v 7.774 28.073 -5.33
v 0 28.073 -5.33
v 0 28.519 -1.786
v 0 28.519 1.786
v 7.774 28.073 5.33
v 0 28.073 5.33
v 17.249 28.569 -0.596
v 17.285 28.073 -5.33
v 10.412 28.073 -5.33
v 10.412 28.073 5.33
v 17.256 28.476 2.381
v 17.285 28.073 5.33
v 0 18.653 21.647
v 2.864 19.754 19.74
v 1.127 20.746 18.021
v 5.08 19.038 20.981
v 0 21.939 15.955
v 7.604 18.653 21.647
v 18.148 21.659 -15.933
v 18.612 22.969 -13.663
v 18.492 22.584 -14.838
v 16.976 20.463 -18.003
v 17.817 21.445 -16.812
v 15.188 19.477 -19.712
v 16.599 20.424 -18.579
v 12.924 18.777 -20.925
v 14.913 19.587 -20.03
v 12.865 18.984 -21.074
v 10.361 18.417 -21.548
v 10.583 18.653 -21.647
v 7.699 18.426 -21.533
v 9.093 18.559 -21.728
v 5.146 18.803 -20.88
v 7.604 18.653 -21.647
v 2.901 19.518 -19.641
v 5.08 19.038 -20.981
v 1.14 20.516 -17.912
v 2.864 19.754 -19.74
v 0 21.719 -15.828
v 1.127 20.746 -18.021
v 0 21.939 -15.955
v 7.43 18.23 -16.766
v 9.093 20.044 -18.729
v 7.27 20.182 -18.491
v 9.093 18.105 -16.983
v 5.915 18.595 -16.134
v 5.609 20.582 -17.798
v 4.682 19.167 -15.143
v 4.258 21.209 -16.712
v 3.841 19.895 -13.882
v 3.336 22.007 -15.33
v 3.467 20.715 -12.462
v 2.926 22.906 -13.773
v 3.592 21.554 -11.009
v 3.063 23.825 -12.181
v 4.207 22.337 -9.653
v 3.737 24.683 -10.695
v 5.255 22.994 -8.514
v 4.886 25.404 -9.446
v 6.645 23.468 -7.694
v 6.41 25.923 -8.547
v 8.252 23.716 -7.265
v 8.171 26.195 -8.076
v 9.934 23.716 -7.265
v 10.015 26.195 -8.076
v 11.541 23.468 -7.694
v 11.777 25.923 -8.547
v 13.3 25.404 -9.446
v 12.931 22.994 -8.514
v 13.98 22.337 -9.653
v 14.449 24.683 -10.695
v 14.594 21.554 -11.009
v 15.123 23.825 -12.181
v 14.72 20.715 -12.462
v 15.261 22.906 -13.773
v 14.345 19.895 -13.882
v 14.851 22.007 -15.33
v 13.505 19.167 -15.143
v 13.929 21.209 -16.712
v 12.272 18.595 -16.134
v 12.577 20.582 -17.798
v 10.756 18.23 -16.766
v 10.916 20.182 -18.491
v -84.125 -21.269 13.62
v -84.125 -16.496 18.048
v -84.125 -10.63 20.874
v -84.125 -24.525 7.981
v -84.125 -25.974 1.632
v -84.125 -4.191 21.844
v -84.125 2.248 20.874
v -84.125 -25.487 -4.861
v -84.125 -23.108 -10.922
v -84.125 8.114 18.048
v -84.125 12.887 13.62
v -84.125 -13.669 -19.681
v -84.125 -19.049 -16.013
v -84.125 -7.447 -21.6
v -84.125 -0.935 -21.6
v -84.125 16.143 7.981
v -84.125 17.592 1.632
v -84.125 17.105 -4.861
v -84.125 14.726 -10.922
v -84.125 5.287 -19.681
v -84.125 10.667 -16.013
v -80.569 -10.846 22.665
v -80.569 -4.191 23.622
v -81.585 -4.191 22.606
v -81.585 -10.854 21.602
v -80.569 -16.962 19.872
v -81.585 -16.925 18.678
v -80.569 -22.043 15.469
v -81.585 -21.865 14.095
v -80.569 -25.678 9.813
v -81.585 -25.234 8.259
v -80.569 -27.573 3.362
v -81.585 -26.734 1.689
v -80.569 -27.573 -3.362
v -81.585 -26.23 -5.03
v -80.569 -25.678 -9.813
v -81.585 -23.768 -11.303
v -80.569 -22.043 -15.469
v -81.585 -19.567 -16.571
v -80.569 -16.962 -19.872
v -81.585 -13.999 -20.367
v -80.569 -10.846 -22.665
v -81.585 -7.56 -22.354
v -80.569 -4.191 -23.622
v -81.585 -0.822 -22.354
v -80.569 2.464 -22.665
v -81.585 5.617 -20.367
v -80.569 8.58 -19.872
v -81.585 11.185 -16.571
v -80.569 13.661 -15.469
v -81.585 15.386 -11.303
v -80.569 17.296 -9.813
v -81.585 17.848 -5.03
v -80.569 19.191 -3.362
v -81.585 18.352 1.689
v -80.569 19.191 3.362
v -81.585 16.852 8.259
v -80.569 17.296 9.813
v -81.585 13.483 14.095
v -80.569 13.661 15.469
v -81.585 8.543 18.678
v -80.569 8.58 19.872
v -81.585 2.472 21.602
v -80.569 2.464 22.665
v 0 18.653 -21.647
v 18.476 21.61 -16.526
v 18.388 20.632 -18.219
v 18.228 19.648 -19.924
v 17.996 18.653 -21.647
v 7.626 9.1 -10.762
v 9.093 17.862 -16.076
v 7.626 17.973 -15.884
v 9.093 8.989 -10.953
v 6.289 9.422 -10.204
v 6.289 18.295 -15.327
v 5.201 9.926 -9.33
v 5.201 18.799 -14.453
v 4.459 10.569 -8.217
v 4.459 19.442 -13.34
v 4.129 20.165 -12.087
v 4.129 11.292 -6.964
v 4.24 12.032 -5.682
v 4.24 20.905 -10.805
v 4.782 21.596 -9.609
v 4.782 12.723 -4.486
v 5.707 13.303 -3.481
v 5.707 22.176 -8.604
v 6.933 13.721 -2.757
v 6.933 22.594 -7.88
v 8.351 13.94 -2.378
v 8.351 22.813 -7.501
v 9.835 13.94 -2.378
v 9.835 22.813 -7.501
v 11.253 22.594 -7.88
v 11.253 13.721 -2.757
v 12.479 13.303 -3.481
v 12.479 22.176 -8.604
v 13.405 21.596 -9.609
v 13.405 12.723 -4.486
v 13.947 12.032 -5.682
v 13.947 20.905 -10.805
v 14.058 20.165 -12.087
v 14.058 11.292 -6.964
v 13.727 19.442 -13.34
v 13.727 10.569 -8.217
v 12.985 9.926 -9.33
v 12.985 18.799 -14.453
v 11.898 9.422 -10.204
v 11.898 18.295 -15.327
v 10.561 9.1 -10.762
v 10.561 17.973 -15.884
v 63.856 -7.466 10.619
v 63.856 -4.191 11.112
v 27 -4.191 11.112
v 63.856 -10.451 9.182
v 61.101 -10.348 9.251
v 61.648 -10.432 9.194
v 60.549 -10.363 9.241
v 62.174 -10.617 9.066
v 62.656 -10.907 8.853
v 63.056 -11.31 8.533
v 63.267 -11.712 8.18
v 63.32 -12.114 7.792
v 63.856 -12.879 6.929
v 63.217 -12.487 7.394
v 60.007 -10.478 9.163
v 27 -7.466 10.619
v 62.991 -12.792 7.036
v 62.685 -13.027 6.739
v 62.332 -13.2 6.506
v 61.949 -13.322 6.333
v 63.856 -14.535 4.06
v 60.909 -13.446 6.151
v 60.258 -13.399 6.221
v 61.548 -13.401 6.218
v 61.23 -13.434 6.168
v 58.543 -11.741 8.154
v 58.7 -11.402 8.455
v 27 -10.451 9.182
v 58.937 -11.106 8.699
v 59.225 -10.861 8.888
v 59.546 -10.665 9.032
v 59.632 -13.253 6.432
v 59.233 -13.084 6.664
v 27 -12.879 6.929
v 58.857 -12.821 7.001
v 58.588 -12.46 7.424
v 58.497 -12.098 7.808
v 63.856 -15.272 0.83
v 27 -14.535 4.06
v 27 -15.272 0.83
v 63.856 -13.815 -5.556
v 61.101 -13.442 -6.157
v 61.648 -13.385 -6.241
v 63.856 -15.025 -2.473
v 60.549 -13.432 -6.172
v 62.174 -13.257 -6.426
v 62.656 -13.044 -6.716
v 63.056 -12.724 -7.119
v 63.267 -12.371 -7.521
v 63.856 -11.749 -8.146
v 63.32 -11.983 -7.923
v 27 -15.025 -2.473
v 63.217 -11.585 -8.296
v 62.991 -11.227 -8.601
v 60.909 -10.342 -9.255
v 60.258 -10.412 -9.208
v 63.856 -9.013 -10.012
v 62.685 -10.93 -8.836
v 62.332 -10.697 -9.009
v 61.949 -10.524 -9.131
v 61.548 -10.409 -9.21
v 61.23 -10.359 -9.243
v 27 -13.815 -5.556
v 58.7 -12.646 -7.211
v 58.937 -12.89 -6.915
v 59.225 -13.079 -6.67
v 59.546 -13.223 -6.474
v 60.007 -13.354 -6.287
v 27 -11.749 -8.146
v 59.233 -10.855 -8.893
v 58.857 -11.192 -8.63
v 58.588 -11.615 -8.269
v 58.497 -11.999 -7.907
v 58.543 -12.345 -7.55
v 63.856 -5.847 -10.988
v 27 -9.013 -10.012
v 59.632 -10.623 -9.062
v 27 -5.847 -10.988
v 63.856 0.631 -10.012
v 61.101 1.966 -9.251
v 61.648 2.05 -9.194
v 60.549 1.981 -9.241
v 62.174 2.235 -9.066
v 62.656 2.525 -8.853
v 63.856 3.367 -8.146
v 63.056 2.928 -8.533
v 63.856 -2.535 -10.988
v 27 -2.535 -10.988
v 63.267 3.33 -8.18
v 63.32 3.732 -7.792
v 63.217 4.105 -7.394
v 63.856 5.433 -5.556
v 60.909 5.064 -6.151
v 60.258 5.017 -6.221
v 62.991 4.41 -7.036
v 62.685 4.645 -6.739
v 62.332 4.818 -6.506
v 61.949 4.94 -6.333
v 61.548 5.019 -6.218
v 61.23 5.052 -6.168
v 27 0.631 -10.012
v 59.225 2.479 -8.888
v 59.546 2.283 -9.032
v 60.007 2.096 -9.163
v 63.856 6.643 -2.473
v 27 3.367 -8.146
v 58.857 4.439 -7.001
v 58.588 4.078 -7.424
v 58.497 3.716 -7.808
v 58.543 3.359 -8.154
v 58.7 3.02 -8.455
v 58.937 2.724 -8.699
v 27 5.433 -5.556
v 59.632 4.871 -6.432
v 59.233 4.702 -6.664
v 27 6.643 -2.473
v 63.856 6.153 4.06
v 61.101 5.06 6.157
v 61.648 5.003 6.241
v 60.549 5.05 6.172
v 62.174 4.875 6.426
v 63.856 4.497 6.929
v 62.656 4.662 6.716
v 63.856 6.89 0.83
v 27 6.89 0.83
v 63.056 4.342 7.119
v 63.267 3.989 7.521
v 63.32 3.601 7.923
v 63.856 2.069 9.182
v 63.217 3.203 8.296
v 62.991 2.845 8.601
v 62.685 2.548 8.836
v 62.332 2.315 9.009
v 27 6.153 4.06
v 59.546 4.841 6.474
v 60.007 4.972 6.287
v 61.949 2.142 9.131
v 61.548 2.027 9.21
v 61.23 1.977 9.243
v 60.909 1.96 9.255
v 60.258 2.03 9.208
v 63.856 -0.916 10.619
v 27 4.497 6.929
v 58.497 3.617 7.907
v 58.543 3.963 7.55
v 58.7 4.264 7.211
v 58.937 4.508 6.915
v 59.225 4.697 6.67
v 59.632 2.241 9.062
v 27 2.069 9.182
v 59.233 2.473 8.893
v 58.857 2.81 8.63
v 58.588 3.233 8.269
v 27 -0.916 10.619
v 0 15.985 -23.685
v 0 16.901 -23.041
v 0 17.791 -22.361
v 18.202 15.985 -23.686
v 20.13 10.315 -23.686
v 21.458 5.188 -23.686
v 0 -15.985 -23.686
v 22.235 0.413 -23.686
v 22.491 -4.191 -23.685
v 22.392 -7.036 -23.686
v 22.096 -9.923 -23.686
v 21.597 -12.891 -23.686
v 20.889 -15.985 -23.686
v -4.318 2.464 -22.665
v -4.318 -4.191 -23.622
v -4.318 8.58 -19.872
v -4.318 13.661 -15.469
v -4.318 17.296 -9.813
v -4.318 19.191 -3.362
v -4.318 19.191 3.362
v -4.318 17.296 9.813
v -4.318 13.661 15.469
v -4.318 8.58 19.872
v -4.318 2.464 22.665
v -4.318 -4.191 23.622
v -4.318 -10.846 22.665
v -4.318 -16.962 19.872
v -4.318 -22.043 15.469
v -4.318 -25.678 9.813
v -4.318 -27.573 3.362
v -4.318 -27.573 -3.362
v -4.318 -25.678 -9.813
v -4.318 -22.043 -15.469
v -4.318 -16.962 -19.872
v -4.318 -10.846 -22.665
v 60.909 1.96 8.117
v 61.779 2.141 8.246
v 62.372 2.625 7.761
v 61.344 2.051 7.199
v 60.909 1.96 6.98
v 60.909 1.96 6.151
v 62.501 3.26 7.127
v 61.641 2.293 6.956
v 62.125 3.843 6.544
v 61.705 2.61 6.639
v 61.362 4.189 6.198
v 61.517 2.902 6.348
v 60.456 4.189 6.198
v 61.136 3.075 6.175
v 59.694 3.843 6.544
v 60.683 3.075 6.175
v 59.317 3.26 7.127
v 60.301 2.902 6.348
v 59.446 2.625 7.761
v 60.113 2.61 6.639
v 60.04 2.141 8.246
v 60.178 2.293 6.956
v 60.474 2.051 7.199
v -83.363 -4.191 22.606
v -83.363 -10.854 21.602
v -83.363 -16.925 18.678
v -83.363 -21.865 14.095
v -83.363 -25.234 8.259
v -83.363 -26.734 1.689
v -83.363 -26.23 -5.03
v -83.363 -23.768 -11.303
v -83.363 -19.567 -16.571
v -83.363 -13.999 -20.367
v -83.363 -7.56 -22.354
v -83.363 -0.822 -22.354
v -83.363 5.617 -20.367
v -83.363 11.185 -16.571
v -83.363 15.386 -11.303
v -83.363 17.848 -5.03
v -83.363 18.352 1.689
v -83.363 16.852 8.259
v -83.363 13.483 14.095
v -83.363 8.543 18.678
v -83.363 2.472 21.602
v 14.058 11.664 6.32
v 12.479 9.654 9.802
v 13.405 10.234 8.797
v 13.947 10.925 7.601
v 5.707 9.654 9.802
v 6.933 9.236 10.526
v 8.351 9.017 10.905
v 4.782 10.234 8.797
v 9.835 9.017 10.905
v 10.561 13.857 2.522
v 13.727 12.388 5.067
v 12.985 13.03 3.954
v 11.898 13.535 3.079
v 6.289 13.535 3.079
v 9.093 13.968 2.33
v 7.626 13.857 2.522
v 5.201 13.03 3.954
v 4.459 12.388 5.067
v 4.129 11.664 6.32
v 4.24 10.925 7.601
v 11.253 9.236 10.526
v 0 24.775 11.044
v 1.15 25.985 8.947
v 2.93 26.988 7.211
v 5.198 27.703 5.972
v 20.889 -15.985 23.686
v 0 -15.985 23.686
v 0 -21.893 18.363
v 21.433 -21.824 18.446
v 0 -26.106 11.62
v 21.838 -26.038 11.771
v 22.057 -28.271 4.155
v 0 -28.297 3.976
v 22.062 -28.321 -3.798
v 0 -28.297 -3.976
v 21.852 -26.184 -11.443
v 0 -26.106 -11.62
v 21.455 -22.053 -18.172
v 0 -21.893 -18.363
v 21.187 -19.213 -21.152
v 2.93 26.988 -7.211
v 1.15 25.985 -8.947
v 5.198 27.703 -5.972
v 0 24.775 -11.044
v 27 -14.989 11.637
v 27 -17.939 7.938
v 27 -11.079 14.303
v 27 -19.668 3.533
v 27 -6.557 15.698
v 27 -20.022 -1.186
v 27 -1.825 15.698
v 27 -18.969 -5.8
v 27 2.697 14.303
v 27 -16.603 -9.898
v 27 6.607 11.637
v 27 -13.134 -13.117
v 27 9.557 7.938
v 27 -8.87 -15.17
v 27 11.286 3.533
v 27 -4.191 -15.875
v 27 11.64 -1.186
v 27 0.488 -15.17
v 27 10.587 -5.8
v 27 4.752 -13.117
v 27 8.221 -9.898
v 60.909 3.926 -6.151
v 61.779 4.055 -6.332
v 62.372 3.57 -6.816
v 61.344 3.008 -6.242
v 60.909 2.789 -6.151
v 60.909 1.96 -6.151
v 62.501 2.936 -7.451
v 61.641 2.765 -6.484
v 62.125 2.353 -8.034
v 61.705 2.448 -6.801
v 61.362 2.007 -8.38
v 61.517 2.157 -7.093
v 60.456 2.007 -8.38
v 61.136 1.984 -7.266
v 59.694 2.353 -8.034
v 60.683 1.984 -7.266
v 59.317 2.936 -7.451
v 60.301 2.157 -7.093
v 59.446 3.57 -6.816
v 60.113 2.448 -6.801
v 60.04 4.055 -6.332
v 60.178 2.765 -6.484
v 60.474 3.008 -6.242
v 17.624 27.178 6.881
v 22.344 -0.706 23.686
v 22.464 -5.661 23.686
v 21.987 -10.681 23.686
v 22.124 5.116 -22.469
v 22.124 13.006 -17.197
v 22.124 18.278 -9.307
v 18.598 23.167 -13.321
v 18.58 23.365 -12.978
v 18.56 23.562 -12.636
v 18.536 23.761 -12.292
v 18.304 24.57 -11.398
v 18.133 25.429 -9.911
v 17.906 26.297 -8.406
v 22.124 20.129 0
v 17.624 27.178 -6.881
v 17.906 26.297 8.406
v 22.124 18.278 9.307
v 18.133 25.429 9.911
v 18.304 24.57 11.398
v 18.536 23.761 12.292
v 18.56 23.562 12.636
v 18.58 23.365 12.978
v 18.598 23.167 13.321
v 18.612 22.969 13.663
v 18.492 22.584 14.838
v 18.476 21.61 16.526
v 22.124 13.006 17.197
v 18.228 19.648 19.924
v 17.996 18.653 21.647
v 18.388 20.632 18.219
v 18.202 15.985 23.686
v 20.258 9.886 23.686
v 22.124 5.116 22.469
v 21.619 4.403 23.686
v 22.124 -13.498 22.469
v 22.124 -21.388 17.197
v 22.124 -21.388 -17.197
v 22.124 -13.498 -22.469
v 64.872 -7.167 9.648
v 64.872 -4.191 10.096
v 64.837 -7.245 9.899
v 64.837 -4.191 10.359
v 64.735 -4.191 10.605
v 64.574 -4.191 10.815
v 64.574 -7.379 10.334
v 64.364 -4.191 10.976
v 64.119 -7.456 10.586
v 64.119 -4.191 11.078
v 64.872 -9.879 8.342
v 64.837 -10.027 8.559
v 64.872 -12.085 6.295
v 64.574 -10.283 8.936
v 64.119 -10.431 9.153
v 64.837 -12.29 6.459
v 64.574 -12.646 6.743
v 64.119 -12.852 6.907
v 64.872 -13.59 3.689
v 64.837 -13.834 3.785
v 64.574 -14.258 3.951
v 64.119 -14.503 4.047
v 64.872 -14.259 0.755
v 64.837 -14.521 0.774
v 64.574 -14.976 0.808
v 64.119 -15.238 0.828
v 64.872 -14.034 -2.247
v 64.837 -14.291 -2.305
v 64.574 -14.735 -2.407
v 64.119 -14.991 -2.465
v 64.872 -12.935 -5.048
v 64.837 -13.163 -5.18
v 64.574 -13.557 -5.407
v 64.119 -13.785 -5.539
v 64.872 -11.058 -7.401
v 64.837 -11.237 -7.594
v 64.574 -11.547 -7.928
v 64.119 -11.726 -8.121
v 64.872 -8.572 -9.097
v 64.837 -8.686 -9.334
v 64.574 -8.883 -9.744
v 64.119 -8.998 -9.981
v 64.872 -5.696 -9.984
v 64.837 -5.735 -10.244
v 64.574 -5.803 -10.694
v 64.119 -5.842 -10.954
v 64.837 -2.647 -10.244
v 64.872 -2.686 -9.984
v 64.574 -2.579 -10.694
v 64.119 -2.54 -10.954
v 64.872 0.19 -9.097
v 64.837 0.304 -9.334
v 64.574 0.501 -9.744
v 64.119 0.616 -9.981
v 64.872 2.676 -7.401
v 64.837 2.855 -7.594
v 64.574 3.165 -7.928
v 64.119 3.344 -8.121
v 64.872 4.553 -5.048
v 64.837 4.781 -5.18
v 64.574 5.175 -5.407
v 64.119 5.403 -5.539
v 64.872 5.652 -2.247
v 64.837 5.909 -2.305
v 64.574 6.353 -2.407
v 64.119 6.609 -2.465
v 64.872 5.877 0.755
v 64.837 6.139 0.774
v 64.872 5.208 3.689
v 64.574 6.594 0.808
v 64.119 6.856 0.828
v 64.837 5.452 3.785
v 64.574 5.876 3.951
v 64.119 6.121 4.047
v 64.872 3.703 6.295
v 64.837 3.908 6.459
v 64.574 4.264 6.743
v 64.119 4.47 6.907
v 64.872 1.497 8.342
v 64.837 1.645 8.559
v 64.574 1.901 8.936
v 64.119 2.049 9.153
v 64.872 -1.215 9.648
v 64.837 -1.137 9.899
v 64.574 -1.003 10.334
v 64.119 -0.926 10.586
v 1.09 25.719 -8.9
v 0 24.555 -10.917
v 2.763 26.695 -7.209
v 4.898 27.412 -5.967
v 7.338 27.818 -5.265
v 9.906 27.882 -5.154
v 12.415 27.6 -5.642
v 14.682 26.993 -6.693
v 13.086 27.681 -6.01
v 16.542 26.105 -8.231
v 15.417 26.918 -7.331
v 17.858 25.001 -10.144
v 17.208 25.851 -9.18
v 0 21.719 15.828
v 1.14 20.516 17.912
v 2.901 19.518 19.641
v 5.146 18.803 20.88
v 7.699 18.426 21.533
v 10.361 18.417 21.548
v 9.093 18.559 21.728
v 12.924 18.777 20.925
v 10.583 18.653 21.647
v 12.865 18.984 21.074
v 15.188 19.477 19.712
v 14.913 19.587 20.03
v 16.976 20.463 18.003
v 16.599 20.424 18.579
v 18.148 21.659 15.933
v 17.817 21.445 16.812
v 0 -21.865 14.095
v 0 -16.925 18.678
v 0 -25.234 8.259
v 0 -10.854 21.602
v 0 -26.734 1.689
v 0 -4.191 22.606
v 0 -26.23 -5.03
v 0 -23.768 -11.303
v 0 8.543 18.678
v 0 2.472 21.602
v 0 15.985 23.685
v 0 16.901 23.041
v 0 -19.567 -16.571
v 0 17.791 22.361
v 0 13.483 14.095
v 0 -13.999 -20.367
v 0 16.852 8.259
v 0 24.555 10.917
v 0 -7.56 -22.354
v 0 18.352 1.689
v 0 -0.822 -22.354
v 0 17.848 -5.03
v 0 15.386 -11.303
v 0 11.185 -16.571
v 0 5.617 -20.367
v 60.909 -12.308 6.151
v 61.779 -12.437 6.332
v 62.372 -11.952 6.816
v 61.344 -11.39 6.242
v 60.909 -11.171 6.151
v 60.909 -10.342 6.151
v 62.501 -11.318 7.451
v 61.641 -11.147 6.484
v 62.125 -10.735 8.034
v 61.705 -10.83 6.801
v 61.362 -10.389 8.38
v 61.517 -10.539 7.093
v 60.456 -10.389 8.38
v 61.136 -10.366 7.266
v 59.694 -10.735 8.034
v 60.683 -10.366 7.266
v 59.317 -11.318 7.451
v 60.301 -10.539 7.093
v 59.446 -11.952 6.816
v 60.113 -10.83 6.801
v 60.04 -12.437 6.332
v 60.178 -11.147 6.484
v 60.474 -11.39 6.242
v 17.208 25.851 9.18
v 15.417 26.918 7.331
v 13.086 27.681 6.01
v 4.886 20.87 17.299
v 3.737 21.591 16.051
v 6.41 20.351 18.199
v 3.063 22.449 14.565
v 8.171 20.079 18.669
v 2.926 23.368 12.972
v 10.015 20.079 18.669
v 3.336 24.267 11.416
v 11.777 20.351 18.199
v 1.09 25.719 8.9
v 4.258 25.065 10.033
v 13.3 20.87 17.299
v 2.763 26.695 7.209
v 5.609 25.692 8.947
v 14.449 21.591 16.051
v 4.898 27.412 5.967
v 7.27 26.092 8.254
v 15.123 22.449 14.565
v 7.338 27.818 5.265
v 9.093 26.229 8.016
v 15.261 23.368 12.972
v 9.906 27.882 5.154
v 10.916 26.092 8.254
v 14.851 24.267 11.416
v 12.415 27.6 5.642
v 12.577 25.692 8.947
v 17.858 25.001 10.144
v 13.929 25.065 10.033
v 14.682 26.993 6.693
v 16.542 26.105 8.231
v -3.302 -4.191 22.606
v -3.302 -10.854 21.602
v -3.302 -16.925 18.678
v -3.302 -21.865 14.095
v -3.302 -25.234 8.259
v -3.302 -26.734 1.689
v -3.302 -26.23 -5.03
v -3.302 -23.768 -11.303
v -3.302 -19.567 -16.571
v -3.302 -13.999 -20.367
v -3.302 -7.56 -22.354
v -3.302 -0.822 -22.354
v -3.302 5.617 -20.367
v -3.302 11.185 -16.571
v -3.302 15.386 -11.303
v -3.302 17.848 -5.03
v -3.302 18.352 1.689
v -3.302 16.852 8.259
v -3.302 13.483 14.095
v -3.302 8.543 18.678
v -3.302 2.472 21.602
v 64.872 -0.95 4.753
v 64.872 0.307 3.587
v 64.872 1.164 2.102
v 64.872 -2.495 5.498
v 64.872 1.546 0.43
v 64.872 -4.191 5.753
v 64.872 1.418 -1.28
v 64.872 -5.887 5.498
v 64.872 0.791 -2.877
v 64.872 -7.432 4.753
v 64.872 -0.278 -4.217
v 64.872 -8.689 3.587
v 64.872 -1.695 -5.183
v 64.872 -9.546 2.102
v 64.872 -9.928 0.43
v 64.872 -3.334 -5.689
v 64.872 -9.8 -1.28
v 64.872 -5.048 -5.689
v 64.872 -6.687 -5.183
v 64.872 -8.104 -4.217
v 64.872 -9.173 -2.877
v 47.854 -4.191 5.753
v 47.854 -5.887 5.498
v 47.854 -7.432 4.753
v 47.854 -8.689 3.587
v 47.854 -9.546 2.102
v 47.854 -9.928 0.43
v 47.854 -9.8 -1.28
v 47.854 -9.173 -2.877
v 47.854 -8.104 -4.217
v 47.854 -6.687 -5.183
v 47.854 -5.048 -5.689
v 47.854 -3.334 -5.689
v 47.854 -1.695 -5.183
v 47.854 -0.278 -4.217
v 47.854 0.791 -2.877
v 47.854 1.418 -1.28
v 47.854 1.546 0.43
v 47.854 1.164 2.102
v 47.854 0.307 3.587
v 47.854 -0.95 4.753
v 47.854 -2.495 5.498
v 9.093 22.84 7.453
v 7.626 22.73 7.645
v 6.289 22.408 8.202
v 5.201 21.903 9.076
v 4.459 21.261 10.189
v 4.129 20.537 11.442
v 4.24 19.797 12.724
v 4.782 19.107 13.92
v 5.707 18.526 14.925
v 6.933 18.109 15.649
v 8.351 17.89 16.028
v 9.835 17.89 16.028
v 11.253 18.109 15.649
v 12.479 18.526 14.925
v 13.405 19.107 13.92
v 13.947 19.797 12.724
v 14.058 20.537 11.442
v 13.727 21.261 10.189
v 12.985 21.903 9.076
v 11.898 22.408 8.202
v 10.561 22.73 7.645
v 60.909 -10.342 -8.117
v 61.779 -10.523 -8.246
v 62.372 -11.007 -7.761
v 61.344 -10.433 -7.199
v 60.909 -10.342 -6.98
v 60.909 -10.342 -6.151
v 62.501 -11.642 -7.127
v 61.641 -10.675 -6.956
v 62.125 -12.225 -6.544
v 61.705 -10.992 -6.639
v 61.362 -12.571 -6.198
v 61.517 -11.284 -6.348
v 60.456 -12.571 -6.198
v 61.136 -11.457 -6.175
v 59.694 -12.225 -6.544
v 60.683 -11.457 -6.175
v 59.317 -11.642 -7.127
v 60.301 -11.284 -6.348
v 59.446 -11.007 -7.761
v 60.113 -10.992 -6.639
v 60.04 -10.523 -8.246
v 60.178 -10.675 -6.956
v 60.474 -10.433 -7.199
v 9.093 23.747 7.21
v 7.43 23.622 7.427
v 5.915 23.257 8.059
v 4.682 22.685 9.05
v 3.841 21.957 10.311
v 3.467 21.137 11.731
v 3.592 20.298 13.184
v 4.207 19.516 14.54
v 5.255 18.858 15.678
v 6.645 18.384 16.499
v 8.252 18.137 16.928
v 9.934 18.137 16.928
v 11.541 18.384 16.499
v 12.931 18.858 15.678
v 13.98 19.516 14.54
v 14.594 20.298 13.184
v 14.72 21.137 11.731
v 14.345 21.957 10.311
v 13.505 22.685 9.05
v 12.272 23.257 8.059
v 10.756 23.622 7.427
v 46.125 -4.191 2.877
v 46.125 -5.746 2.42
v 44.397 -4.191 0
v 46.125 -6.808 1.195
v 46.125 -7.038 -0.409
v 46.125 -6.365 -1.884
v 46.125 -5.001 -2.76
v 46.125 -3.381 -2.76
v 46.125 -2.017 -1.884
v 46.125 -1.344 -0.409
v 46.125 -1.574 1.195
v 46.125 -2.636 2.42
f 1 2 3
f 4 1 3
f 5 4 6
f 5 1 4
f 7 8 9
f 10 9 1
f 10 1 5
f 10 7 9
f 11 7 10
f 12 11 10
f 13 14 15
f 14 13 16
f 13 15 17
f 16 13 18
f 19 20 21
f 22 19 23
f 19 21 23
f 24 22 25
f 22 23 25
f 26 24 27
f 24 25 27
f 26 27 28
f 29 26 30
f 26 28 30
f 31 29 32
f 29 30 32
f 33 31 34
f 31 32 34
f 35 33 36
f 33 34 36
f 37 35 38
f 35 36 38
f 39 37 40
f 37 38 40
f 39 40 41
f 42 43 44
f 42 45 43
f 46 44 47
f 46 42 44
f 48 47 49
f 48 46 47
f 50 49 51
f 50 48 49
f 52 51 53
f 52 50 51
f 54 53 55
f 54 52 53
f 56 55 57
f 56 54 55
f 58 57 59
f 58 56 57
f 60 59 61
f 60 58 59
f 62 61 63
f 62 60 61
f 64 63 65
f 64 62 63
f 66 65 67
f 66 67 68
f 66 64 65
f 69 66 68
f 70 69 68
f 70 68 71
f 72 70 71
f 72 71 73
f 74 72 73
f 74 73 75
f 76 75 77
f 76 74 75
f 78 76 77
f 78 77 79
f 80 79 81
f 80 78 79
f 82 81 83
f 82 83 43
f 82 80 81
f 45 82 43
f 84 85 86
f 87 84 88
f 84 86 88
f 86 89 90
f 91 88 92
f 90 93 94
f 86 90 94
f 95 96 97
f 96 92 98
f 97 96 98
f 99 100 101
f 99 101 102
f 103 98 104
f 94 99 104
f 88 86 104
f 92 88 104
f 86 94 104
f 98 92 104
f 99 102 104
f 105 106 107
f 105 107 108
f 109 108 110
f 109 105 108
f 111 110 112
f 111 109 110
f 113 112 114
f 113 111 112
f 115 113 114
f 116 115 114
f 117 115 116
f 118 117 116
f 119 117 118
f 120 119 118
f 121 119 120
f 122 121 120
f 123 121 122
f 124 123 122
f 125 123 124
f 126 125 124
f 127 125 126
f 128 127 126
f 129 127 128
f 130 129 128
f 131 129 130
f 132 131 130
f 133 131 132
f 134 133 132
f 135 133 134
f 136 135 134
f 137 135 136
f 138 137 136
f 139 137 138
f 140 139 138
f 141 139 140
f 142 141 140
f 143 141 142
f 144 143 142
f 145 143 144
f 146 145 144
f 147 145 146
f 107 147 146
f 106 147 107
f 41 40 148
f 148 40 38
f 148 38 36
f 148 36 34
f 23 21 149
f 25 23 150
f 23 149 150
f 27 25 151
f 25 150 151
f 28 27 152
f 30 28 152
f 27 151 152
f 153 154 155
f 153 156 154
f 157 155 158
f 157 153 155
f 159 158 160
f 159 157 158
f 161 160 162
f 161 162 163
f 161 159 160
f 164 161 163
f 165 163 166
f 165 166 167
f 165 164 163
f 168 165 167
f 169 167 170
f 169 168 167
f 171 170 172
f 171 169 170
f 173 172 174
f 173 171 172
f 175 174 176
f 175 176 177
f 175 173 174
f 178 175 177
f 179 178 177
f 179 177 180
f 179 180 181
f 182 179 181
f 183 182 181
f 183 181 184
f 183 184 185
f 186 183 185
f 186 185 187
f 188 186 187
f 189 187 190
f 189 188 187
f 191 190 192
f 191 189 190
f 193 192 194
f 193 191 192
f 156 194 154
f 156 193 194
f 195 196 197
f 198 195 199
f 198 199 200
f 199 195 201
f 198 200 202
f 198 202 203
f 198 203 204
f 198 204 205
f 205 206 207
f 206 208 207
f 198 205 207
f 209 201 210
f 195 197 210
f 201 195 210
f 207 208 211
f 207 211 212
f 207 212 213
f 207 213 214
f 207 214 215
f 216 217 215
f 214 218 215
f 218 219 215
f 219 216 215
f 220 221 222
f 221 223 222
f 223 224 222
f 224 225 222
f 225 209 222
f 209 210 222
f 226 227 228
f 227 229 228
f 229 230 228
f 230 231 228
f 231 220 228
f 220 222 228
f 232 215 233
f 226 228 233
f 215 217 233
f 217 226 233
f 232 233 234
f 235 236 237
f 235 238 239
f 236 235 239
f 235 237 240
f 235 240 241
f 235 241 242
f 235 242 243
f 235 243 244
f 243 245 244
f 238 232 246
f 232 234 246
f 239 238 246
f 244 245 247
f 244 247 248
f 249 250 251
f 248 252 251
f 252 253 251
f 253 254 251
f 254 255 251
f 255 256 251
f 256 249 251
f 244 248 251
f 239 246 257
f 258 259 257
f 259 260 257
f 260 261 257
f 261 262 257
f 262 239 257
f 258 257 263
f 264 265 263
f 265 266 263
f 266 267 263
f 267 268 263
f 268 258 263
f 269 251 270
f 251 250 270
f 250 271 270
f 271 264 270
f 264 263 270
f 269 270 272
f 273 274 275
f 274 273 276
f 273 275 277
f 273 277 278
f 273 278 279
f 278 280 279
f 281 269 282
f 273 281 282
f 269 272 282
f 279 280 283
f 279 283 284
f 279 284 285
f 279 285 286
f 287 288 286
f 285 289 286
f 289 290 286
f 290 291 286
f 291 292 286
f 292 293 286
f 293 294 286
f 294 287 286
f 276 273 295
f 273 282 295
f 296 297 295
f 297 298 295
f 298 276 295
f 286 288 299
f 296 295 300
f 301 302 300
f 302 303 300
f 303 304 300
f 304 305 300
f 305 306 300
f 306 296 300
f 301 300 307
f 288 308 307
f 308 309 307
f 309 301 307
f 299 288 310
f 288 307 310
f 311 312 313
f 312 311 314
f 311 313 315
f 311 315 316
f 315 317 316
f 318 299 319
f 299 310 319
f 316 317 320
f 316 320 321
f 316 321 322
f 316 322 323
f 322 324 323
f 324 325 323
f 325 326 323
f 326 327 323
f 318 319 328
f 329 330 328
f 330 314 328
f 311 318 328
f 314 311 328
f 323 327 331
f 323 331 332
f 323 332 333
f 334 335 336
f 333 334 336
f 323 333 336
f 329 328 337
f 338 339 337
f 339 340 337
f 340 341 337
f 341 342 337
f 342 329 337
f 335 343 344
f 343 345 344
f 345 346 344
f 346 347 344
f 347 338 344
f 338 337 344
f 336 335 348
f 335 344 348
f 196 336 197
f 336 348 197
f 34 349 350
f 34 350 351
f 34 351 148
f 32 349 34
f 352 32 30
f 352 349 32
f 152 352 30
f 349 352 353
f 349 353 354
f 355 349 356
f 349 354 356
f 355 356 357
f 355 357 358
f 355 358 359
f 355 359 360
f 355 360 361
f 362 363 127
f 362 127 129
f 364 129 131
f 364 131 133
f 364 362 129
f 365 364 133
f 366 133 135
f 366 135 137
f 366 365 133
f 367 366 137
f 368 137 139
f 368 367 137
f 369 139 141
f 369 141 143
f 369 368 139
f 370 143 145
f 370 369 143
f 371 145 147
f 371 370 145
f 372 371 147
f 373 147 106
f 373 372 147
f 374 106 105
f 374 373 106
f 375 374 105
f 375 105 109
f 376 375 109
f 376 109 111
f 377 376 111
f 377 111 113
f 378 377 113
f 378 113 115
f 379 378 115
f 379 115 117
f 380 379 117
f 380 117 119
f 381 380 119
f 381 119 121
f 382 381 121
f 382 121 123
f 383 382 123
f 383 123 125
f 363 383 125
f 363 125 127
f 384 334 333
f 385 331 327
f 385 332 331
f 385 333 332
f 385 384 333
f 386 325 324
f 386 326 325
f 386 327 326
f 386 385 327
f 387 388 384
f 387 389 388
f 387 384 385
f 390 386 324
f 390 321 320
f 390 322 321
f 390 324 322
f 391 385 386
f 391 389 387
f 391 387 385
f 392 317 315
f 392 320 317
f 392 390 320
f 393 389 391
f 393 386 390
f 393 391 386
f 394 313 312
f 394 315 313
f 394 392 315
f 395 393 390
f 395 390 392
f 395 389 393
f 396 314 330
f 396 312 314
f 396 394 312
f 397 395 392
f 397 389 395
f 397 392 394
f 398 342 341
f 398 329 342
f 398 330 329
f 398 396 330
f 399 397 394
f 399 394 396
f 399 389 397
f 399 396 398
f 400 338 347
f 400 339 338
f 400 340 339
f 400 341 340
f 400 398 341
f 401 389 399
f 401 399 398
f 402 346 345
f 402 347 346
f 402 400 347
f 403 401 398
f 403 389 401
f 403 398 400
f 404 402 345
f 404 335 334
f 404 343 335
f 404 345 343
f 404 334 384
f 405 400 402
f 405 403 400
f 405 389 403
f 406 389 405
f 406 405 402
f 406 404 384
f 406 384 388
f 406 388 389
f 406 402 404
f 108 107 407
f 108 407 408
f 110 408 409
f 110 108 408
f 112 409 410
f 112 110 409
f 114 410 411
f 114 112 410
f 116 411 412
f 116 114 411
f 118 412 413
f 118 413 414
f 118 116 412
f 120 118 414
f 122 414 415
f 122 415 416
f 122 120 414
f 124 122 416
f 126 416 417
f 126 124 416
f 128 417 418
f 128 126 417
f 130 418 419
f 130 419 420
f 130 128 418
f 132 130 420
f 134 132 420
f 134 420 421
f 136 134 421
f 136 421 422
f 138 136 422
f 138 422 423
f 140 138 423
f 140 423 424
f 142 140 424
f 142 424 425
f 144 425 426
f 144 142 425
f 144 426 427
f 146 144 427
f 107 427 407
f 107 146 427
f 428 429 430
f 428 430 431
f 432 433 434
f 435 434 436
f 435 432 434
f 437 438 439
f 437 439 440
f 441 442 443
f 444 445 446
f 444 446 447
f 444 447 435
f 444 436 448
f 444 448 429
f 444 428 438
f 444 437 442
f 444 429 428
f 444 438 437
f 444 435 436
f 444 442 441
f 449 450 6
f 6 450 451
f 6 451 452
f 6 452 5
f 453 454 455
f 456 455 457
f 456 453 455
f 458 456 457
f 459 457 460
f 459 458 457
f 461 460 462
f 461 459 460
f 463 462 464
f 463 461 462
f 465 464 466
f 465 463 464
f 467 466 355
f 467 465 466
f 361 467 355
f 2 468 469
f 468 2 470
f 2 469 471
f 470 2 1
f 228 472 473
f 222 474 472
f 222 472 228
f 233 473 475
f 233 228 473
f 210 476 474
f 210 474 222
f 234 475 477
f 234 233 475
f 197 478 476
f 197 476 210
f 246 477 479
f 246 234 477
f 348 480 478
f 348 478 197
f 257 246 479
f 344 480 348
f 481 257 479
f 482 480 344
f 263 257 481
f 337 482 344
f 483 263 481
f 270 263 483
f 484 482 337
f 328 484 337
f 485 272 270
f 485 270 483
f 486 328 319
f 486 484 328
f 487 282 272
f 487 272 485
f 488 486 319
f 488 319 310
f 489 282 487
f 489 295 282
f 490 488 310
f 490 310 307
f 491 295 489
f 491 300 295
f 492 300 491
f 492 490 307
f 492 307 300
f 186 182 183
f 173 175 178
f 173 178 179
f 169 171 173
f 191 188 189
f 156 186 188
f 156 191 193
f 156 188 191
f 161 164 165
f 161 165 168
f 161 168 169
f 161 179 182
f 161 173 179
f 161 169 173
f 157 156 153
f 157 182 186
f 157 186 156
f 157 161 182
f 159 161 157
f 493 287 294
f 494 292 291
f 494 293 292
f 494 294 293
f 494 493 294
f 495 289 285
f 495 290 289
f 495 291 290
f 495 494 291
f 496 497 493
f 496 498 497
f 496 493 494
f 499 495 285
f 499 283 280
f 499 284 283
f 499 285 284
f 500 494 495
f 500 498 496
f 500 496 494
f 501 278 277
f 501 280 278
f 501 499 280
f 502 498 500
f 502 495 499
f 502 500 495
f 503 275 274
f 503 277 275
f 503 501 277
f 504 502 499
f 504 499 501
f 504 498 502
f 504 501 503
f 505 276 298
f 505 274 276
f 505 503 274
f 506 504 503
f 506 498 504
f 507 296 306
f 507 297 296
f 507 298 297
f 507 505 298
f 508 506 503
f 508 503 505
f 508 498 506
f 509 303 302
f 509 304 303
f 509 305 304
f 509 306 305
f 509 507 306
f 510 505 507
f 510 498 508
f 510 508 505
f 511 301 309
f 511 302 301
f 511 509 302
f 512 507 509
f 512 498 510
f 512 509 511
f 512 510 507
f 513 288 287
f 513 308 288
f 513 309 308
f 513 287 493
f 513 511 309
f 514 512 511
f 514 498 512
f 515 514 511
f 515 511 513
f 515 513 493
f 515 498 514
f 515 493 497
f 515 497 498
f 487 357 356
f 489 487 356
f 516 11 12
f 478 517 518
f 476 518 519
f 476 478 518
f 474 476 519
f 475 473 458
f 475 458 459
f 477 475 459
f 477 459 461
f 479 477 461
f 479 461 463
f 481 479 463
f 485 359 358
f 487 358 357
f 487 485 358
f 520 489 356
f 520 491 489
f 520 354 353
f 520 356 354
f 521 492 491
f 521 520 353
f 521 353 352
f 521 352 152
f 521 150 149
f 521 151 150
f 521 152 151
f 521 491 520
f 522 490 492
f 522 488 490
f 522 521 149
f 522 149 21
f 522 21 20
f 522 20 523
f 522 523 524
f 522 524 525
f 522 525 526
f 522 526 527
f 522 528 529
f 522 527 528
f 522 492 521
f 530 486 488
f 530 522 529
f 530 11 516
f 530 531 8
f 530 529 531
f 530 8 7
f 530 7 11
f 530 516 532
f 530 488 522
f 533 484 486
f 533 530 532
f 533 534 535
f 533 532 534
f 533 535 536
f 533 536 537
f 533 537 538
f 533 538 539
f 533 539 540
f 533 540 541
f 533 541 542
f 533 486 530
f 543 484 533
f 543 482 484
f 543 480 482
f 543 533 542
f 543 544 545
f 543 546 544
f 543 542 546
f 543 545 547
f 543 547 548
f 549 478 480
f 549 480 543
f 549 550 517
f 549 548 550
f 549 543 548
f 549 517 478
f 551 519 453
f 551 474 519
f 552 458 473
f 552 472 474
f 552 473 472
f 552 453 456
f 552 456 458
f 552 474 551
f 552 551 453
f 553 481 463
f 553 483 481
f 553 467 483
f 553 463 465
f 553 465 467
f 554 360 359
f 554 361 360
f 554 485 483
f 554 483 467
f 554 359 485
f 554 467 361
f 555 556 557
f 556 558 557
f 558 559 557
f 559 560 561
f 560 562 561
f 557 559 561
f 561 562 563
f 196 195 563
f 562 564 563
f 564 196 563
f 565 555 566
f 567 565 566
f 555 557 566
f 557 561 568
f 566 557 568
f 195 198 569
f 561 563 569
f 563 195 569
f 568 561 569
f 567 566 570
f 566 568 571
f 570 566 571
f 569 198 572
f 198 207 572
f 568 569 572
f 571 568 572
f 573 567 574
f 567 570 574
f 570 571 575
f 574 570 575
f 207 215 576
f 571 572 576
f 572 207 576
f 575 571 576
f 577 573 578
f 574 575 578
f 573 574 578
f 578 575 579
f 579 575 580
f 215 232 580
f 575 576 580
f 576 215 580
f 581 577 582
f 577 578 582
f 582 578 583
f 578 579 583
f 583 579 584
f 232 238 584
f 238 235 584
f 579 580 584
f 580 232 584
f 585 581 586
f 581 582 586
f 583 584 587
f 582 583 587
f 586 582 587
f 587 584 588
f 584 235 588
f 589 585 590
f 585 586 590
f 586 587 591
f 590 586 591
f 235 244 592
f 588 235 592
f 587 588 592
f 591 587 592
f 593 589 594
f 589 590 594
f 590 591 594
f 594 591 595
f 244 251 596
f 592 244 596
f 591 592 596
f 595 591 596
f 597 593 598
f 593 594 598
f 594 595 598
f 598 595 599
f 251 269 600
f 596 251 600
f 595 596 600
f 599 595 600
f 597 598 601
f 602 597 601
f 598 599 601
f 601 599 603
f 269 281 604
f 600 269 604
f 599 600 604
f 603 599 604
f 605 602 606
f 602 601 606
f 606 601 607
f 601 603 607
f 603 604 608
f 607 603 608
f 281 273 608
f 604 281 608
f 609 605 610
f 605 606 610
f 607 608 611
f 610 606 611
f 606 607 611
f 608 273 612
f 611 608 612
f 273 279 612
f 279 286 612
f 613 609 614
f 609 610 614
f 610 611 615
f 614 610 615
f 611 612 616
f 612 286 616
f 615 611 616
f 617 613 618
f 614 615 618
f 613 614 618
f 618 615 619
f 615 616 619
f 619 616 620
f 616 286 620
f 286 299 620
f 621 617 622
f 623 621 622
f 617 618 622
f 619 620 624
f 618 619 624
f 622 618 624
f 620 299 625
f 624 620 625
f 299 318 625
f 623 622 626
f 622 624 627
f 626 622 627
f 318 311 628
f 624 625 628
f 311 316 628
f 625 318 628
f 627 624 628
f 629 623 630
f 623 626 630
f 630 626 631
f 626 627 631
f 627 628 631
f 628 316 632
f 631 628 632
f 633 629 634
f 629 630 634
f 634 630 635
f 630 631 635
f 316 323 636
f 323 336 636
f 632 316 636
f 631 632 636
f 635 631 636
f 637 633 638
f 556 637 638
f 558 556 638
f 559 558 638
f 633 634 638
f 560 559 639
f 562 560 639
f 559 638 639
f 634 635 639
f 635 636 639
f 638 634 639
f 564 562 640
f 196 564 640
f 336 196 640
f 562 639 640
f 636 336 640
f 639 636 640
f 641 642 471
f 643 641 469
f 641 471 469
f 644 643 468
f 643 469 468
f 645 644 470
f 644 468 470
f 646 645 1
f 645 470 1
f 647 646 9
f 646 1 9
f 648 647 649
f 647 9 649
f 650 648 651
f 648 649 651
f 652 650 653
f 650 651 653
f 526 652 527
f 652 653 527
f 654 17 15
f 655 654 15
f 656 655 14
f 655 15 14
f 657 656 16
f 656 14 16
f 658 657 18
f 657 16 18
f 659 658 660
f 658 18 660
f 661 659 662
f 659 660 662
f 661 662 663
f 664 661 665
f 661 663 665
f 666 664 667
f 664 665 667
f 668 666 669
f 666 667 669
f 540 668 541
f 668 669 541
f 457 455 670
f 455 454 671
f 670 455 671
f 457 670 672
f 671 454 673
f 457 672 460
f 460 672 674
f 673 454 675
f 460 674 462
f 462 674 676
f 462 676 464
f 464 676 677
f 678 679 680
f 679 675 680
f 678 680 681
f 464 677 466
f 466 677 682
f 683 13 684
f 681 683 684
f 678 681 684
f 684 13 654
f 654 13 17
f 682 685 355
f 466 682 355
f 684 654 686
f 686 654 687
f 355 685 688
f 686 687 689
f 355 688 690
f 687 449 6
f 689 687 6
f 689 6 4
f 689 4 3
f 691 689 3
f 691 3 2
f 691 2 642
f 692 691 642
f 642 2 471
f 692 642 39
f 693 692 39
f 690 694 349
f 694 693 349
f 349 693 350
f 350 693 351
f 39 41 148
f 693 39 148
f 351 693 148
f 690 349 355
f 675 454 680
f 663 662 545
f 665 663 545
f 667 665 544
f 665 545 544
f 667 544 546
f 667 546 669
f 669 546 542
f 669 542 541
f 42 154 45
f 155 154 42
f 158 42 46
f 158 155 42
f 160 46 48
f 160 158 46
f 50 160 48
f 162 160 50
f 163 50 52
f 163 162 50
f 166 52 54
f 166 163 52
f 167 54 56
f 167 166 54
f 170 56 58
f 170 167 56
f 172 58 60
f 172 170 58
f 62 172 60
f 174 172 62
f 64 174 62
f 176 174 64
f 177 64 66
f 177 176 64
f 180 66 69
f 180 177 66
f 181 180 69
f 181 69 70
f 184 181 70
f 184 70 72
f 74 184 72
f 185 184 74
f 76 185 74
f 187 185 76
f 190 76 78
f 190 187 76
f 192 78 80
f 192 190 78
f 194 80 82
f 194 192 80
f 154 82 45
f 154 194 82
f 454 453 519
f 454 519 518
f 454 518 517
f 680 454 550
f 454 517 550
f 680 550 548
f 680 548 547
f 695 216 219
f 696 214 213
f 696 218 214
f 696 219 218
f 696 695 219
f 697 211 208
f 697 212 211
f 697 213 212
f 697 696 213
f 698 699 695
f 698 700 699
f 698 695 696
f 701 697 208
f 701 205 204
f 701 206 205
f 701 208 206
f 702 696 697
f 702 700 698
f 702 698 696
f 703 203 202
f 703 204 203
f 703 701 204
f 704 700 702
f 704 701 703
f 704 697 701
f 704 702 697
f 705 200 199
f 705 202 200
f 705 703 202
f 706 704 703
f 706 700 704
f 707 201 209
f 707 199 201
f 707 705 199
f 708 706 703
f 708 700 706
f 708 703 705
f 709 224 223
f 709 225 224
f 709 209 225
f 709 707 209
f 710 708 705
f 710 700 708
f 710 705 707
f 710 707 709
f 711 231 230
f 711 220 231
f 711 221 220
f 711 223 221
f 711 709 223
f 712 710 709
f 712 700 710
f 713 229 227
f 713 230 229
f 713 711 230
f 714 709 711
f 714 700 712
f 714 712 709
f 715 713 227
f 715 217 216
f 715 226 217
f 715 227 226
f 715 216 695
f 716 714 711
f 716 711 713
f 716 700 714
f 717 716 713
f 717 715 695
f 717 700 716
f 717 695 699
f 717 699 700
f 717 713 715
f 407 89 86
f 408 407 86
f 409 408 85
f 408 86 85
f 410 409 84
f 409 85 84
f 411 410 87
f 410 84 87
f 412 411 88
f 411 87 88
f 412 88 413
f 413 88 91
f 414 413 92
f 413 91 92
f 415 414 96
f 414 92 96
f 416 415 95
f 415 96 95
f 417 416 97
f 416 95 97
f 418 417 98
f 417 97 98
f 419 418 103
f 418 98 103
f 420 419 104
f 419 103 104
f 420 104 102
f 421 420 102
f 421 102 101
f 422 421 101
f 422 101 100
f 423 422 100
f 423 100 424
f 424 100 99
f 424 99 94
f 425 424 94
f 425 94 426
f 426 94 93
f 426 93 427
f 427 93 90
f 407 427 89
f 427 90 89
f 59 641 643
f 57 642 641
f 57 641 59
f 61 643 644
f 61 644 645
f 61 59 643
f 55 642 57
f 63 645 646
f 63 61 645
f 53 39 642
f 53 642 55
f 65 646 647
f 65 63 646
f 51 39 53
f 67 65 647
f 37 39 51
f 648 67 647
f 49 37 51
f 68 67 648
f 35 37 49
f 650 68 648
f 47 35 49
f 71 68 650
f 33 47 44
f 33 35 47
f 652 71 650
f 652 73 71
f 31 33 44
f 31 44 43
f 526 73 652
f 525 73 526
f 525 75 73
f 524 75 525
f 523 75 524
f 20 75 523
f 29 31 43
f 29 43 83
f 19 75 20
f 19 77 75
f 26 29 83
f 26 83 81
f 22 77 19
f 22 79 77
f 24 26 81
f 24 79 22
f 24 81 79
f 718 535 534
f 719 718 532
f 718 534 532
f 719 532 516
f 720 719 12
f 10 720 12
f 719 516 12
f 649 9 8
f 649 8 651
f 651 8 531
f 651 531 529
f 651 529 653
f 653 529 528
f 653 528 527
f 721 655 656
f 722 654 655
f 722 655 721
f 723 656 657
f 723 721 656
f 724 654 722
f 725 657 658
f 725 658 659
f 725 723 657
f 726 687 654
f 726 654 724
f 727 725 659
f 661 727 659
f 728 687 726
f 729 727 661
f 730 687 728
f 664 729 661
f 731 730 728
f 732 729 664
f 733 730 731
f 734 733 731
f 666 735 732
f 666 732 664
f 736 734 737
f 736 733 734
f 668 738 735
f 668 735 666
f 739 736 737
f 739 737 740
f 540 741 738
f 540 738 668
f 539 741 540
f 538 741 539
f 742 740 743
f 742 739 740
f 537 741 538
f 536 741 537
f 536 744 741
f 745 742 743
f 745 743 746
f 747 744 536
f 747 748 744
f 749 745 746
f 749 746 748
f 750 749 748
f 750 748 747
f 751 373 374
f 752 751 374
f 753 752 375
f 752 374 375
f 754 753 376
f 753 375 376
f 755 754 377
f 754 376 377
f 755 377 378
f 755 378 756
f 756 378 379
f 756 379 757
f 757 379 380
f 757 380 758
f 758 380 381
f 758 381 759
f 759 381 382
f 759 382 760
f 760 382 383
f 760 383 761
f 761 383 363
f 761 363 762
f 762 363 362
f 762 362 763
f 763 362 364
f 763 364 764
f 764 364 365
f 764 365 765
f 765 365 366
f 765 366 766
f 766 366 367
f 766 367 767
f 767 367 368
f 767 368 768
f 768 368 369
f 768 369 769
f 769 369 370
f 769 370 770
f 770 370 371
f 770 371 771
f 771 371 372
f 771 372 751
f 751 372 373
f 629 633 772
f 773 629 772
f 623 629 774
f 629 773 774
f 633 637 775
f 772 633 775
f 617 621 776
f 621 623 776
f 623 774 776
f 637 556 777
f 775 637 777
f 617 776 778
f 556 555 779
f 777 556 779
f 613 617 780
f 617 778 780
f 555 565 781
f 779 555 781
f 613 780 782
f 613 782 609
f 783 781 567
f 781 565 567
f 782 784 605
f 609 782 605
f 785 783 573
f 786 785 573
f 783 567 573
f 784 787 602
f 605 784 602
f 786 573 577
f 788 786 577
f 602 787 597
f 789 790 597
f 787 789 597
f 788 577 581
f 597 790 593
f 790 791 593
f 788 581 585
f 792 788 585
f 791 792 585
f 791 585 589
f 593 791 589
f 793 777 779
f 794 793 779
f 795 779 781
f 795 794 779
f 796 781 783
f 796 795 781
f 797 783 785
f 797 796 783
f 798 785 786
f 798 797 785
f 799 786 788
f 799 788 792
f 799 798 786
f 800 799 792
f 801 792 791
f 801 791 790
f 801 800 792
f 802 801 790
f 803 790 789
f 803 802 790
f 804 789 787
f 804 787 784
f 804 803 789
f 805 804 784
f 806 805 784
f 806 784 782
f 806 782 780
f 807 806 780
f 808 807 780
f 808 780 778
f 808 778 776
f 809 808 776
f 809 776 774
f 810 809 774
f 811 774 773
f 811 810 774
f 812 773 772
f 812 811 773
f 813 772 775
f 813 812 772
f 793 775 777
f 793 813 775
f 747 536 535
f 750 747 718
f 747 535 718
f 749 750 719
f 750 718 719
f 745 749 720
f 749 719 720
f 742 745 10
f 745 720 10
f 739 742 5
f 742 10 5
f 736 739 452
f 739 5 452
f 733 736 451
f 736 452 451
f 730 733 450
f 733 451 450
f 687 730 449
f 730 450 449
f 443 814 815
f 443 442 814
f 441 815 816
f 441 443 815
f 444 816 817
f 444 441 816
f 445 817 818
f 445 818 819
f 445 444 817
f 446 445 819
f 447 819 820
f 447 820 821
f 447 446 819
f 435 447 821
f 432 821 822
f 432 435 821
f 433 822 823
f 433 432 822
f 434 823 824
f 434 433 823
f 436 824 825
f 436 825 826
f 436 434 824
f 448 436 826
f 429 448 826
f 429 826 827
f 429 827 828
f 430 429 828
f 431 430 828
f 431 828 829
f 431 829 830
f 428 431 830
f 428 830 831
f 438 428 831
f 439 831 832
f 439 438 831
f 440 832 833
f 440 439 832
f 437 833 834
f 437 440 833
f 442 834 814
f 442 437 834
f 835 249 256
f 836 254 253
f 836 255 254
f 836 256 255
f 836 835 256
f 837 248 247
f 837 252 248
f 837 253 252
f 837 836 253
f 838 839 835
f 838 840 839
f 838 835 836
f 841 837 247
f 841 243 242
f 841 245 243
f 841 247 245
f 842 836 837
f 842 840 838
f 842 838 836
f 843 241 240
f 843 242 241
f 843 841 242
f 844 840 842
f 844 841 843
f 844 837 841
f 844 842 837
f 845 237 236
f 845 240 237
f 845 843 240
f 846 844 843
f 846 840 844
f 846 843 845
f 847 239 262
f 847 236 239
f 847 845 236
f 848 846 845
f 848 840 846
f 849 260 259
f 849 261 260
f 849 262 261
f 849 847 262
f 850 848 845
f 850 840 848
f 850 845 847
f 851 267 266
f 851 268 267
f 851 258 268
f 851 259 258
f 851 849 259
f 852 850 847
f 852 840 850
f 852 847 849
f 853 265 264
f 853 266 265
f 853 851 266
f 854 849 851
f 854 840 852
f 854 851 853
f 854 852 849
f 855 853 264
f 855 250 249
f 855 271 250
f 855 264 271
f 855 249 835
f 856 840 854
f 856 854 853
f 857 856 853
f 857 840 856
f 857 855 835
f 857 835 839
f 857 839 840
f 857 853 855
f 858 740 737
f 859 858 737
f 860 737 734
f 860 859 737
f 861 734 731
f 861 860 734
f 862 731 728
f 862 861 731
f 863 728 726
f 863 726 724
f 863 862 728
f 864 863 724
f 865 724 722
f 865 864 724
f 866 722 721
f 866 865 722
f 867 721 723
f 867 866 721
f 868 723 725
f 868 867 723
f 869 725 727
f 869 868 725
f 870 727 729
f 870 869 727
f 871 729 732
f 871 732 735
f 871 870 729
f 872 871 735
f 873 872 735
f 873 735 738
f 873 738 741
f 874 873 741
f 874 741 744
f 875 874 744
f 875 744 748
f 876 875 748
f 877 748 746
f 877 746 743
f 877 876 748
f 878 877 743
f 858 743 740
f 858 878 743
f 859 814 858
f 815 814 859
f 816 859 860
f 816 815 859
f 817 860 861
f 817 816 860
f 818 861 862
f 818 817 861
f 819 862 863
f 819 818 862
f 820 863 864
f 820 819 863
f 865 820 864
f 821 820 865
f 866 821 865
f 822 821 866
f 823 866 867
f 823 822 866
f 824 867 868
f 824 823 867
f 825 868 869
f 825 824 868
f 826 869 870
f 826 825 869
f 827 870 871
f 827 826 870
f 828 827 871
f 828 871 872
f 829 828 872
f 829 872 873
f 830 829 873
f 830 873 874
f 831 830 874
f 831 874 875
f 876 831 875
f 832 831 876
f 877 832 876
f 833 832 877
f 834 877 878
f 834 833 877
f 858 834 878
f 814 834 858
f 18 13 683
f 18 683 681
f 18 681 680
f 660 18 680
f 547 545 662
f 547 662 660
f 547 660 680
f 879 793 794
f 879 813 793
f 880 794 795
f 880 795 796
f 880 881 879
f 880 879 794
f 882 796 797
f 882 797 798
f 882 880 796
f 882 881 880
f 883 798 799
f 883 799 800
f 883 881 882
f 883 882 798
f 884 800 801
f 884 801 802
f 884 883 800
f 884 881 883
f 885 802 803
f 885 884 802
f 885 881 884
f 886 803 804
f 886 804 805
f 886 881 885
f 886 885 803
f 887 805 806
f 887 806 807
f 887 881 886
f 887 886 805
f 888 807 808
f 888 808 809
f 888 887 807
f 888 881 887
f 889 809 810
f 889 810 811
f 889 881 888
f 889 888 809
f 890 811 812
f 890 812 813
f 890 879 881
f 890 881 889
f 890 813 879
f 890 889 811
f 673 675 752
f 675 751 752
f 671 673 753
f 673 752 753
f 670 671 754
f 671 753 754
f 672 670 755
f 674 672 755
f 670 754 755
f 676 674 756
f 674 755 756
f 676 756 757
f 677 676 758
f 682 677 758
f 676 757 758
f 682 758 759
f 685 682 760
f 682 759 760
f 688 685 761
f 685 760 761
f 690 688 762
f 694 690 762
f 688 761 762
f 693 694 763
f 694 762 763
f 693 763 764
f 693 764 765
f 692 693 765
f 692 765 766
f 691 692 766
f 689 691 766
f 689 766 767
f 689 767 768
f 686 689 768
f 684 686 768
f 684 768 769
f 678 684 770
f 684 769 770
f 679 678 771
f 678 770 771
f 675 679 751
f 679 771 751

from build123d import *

# Parameters (mm, degrees)
SKETCH1_R           = 28.575
EXTRUDE1_DEPTH      = 27.0002
EXTRUDE1_DEPTH_BACK = 84.1248
CUT_EXTRUDE1_REACH  = 86.125
SKETCH2_R           = 28.575
SKETCH2_R_2         = 23.622
CUT_EXTRUDE3_START  = -27.0002
CUT_EXTRUDE3_DEPTH  = 27.0002
SKETCH18_R          = 9.525
CUT_EXTRUDE4_DEPTH  = 0.254
SKETCH19_R          = 9.525
CUT_EXTRUDE5_DEPTH  = 0.254
CHAMFER1_SIZE       = 0.762
CIRPATTERN1_COUNT   = 4


with BuildPart() as part:
    # Sketch1 → Extrude1 (new body, two sides)
    with BuildSketch(Plane(origin=(0, 0, 0), x_dir=(0, 0, -1), z_dir=(1, 0, 0))) as extrude1_sk:
        Circle(SKETCH1_R)
    extrude(amount=EXTRUDE1_DEPTH)
    extrude(extrude1_sk.sketch, amount=-EXTRUDE1_DEPTH_BACK)

    # Sketch2 → Cut-Extrude1 (cut, up to next)
    with BuildSketch(Plane(origin=(0, 0, 0), x_dir=(0, 0, -1), z_dir=(1, 0, 0)), mode=Mode.PRIVATE) as cut_extrude1_sk1:
        Circle(SKETCH2_R)
        with Locations((0, -4.191)):
            Circle(SKETCH2_R_2, mode=Mode.SUBTRACT)
    cut_extrude1_tool1 = extrude(cut_extrude1_sk1.sketch, amount=-CUT_EXTRUDE1_REACH, mode=Mode.PRIVATE) & part.part
    add(cut_extrude1_tool1.solids().sort_by_distance((0, 0, 27.766777))[0], mode=Mode.SUBTRACT)

    # Sketch4 → Cut-Extrude3 (cut)
    with BuildSketch(Plane.ZY.offset(CUT_EXTRUDE3_START)):
        with BuildLine():
            Line((23.6855, -25.666178421), (23.6855, 17.476089577))
            Line((23.6855, 17.476089577), (0, 31.150919378))
            Line((0, 31.150919378), (-23.6855, 17.476089577))
            Line((-23.6855, 17.476089577), (-23.6855, -25.666178421))
            ThreePointArc((-23.6855, -25.666178421), (0, 34.925), (23.6855, -25.666178421))
        make_face()
    extrude(amount=CUT_EXTRUDE3_DEPTH, mode=Mode.SUBTRACT)

    # Sketch6 → Cut-Revolve2 (revolve, cut)
    with BuildSketch(Plane.XY, mode=Mode.PRIVATE) as cut_revolve2_sk:
        Polygon((0.750392661, 57.15), (27.0002, 11.684), (27.0002, 57.15), align=None)
    revolve(cut_revolve2_sk.sketch.rotate(Axis((-0.562097706, -4.191, 0), (1, 0, 0)), 270), axis=Axis((-0.562097706, -4.191, 0), (1, 0, 0)), mode=Mode.SUBTRACT)  # turned: the seam where the file's is

    # S2D0002 → Cut-Revolve3 (revolve, cut)
    with BuildSketch(Plane(origin=(9.0932, 23.136869081, 13.372742289), x_dir=(0, 0.5, -0.866025404), z_dir=(1, 0, 0))):
        Polygon((0, 0), (6.1849, 0), (5.642306865, -2.5527), (4.9784, -3.216606865), (4.9784, -13.462), (0, -13.462), align=None)
    revolve(axis=Axis((9.0932, 10.895513396, 6.305192289), (0, 0.866025404, 0.5)), mode=Mode.SUBTRACT)

    # Sketch8 → Cut-Revolve4 (revolve, cut)
    with BuildSketch(Plane(origin=(9.0932, 23.136869081, -13.372742289), x_dir=(0, -0.5, -0.866025404), z_dir=(1, 0, 0))):
        Polygon((0, 0), (6.1849, 0), (5.642306865, -2.5527), (4.9784, -3.216606865), (4.9784, -13.462), (0, -13.462), align=None)
    revolve(axis=Axis((9.0932, 10.895513396, -6.305192289), (0, 0.866025404, -0.5)), mode=Mode.SUBTRACT)

    # Sketch18 → Cut-Extrude4 (cut)
    with BuildSketch(Plane(origin=(0, 23.363189534, 13.488743766), x_dir=(1, 0, 0), z_dir=(0, 0.866025404, 0.5))):
        with Locations((9.0932, -0.0127)):
            Circle(SKETCH18_R)
    extrude(amount=-CUT_EXTRUDE4_DEPTH, mode=Mode.SUBTRACT)

    # Sketch19 → Cut-Extrude5 (cut)
    with BuildSketch(Plane(origin=(0, 23.363189534, -13.488743766), x_dir=(1, 0, 0), z_dir=(0, 0.866025404, -0.5))):
        with Locations((9.0932, 0.0127)):
            Circle(SKETCH19_R)
    extrude(amount=-CUT_EXTRUDE5_DEPTH, mode=Mode.SUBTRACT)

    # Sketch10 → Cut-Revolve6 (revolve, cut)
    with BuildSketch(Plane.XY, mode=Mode.PRIVATE) as cut_revolve6_sk:
        Polygon((0, 19.431), (0, 18.415), (-3.302, 18.415), (-4.318, 19.431), align=None)
    revolve(cut_revolve6_sk.sketch.rotate(Axis((-4.5339, -4.191, 0), (1, 0, 0)), 90), axis=Axis((-4.5339, -4.191, 0), (1, 0, 0)), mode=Mode.SUBTRACT)  # turned: the seam where the file's is

    # Sketch12 → Cut-Revolve8 (revolve, cut)
    with BuildSketch(Plane.XY, mode=Mode.PRIVATE) as cut_revolve8_sk:
        Polygon((-84.1248, 19.431), (-84.1248, 18.415), (-81.5848, 18.415), (-80.5688, 19.431), align=None)
    revolve(cut_revolve8_sk.sketch.rotate(Axis((-84.3026, -4.191, 0), (1, 0, 0)), 90), axis=Axis((-84.3026, -4.191, 0), (1, 0, 0)), mode=Mode.SUBTRACT)  # turned: the seam where the file's is

    # Chamfer1
    chamfer1_edges = [part.edges().sort_by_distance(p)[0] for p in [
        (-84.1248, -4.191, -22.606),
    ]]
    chamfer(chamfer1_edges, length=CHAMFER1_SIZE)

    # Sketch13 → Revolve1 (revolve)
    with BuildSketch(Plane(origin=(0, 0, 0), x_dir=(0, -1, 0), z_dir=(0, 0, 1)), mode=Mode.PRIVATE) as revolve1_sk:
        with BuildLine():
            Line((4.191, 27.0002), (4.191, 64.8716))
            Line((4.191, 64.8716), (14.2875, 64.8716))
            ThreePointArc((14.2875, 64.8716), (15.00592049, 64.57402049), (15.3035, 63.8556))
            Line((15.3035, 63.8556), (15.3035, 27.0002))
            Line((15.3035, 27.0002), (4.191, 27.0002))
        make_face()
    revolve(revolve1_sk.sketch.rotate(Axis((25.10663, -4.191, 0), (1, 0, 0)), 270), axis=Axis((25.10663, -4.191, 0), (1, 0, 0)))  # turned: the seam where the file's is

    # S2D0001 → Cut-Revolve9 (revolve, cut)
    with BuildSketch(Plane(origin=(64.8716, -9.9441, 0), x_dir=(0, -1, 0), z_dir=(0, 0, 1)), mode=Mode.PRIVATE) as cut_revolve9_sk:
        Polygon((0, 0), (0, -17.018), (-5.7531, -20.474811227), (-5.7531, 0), align=None)
    revolve(cut_revolve9_sk.sketch.rotate(Axis((43.373048211, -4.191, 0), (1, 0, 0)), 270), axis=Axis((43.373048211, -4.191, 0), (1, 0, 0)), mode=Mode.SUBTRACT)  # turned: the seam where the file's is

    # Sketch16 → Cut-Revolve10 (revolve, cut)
    with BuildSketch(Plane(origin=(60.9092, 3.666724106, -7.857724106), x_dir=(-1, 0, 0), z_dir=(0, -0.707106781, -0.707106781)), mode=Mode.PRIVATE) as cut_revolve10_sk:
        Polygon((0, 0), (2.413, 0), (0, -2.413), align=None)
    cut_revolve10 = revolve(cut_revolve10_sk.sketch.rotate(Axis((60.9092, 0.494324135, -4.685324135), (0, 0.707106781, -0.707106781)), 90), axis=Axis((60.9092, 0.494324135, -4.685324135), (0, 0.707106781, -0.707106781)), mode=Mode.SUBTRACT)  # turned: the seam where the file's is

    # CirPattern1: Cut-Revolve10 ×4 about axis
    cirpattern1_axis = Axis((25.10663, -4.191, 0), (-1, 0, 0))
    for i in range(1, CIRPATTERN1_COUNT):
        add(cut_revolve10.rotate(cirpattern1_axis, i * 360 / CIRPATTERN1_COUNT), mode=Mode.SUBTRACT)


solid = part.part
